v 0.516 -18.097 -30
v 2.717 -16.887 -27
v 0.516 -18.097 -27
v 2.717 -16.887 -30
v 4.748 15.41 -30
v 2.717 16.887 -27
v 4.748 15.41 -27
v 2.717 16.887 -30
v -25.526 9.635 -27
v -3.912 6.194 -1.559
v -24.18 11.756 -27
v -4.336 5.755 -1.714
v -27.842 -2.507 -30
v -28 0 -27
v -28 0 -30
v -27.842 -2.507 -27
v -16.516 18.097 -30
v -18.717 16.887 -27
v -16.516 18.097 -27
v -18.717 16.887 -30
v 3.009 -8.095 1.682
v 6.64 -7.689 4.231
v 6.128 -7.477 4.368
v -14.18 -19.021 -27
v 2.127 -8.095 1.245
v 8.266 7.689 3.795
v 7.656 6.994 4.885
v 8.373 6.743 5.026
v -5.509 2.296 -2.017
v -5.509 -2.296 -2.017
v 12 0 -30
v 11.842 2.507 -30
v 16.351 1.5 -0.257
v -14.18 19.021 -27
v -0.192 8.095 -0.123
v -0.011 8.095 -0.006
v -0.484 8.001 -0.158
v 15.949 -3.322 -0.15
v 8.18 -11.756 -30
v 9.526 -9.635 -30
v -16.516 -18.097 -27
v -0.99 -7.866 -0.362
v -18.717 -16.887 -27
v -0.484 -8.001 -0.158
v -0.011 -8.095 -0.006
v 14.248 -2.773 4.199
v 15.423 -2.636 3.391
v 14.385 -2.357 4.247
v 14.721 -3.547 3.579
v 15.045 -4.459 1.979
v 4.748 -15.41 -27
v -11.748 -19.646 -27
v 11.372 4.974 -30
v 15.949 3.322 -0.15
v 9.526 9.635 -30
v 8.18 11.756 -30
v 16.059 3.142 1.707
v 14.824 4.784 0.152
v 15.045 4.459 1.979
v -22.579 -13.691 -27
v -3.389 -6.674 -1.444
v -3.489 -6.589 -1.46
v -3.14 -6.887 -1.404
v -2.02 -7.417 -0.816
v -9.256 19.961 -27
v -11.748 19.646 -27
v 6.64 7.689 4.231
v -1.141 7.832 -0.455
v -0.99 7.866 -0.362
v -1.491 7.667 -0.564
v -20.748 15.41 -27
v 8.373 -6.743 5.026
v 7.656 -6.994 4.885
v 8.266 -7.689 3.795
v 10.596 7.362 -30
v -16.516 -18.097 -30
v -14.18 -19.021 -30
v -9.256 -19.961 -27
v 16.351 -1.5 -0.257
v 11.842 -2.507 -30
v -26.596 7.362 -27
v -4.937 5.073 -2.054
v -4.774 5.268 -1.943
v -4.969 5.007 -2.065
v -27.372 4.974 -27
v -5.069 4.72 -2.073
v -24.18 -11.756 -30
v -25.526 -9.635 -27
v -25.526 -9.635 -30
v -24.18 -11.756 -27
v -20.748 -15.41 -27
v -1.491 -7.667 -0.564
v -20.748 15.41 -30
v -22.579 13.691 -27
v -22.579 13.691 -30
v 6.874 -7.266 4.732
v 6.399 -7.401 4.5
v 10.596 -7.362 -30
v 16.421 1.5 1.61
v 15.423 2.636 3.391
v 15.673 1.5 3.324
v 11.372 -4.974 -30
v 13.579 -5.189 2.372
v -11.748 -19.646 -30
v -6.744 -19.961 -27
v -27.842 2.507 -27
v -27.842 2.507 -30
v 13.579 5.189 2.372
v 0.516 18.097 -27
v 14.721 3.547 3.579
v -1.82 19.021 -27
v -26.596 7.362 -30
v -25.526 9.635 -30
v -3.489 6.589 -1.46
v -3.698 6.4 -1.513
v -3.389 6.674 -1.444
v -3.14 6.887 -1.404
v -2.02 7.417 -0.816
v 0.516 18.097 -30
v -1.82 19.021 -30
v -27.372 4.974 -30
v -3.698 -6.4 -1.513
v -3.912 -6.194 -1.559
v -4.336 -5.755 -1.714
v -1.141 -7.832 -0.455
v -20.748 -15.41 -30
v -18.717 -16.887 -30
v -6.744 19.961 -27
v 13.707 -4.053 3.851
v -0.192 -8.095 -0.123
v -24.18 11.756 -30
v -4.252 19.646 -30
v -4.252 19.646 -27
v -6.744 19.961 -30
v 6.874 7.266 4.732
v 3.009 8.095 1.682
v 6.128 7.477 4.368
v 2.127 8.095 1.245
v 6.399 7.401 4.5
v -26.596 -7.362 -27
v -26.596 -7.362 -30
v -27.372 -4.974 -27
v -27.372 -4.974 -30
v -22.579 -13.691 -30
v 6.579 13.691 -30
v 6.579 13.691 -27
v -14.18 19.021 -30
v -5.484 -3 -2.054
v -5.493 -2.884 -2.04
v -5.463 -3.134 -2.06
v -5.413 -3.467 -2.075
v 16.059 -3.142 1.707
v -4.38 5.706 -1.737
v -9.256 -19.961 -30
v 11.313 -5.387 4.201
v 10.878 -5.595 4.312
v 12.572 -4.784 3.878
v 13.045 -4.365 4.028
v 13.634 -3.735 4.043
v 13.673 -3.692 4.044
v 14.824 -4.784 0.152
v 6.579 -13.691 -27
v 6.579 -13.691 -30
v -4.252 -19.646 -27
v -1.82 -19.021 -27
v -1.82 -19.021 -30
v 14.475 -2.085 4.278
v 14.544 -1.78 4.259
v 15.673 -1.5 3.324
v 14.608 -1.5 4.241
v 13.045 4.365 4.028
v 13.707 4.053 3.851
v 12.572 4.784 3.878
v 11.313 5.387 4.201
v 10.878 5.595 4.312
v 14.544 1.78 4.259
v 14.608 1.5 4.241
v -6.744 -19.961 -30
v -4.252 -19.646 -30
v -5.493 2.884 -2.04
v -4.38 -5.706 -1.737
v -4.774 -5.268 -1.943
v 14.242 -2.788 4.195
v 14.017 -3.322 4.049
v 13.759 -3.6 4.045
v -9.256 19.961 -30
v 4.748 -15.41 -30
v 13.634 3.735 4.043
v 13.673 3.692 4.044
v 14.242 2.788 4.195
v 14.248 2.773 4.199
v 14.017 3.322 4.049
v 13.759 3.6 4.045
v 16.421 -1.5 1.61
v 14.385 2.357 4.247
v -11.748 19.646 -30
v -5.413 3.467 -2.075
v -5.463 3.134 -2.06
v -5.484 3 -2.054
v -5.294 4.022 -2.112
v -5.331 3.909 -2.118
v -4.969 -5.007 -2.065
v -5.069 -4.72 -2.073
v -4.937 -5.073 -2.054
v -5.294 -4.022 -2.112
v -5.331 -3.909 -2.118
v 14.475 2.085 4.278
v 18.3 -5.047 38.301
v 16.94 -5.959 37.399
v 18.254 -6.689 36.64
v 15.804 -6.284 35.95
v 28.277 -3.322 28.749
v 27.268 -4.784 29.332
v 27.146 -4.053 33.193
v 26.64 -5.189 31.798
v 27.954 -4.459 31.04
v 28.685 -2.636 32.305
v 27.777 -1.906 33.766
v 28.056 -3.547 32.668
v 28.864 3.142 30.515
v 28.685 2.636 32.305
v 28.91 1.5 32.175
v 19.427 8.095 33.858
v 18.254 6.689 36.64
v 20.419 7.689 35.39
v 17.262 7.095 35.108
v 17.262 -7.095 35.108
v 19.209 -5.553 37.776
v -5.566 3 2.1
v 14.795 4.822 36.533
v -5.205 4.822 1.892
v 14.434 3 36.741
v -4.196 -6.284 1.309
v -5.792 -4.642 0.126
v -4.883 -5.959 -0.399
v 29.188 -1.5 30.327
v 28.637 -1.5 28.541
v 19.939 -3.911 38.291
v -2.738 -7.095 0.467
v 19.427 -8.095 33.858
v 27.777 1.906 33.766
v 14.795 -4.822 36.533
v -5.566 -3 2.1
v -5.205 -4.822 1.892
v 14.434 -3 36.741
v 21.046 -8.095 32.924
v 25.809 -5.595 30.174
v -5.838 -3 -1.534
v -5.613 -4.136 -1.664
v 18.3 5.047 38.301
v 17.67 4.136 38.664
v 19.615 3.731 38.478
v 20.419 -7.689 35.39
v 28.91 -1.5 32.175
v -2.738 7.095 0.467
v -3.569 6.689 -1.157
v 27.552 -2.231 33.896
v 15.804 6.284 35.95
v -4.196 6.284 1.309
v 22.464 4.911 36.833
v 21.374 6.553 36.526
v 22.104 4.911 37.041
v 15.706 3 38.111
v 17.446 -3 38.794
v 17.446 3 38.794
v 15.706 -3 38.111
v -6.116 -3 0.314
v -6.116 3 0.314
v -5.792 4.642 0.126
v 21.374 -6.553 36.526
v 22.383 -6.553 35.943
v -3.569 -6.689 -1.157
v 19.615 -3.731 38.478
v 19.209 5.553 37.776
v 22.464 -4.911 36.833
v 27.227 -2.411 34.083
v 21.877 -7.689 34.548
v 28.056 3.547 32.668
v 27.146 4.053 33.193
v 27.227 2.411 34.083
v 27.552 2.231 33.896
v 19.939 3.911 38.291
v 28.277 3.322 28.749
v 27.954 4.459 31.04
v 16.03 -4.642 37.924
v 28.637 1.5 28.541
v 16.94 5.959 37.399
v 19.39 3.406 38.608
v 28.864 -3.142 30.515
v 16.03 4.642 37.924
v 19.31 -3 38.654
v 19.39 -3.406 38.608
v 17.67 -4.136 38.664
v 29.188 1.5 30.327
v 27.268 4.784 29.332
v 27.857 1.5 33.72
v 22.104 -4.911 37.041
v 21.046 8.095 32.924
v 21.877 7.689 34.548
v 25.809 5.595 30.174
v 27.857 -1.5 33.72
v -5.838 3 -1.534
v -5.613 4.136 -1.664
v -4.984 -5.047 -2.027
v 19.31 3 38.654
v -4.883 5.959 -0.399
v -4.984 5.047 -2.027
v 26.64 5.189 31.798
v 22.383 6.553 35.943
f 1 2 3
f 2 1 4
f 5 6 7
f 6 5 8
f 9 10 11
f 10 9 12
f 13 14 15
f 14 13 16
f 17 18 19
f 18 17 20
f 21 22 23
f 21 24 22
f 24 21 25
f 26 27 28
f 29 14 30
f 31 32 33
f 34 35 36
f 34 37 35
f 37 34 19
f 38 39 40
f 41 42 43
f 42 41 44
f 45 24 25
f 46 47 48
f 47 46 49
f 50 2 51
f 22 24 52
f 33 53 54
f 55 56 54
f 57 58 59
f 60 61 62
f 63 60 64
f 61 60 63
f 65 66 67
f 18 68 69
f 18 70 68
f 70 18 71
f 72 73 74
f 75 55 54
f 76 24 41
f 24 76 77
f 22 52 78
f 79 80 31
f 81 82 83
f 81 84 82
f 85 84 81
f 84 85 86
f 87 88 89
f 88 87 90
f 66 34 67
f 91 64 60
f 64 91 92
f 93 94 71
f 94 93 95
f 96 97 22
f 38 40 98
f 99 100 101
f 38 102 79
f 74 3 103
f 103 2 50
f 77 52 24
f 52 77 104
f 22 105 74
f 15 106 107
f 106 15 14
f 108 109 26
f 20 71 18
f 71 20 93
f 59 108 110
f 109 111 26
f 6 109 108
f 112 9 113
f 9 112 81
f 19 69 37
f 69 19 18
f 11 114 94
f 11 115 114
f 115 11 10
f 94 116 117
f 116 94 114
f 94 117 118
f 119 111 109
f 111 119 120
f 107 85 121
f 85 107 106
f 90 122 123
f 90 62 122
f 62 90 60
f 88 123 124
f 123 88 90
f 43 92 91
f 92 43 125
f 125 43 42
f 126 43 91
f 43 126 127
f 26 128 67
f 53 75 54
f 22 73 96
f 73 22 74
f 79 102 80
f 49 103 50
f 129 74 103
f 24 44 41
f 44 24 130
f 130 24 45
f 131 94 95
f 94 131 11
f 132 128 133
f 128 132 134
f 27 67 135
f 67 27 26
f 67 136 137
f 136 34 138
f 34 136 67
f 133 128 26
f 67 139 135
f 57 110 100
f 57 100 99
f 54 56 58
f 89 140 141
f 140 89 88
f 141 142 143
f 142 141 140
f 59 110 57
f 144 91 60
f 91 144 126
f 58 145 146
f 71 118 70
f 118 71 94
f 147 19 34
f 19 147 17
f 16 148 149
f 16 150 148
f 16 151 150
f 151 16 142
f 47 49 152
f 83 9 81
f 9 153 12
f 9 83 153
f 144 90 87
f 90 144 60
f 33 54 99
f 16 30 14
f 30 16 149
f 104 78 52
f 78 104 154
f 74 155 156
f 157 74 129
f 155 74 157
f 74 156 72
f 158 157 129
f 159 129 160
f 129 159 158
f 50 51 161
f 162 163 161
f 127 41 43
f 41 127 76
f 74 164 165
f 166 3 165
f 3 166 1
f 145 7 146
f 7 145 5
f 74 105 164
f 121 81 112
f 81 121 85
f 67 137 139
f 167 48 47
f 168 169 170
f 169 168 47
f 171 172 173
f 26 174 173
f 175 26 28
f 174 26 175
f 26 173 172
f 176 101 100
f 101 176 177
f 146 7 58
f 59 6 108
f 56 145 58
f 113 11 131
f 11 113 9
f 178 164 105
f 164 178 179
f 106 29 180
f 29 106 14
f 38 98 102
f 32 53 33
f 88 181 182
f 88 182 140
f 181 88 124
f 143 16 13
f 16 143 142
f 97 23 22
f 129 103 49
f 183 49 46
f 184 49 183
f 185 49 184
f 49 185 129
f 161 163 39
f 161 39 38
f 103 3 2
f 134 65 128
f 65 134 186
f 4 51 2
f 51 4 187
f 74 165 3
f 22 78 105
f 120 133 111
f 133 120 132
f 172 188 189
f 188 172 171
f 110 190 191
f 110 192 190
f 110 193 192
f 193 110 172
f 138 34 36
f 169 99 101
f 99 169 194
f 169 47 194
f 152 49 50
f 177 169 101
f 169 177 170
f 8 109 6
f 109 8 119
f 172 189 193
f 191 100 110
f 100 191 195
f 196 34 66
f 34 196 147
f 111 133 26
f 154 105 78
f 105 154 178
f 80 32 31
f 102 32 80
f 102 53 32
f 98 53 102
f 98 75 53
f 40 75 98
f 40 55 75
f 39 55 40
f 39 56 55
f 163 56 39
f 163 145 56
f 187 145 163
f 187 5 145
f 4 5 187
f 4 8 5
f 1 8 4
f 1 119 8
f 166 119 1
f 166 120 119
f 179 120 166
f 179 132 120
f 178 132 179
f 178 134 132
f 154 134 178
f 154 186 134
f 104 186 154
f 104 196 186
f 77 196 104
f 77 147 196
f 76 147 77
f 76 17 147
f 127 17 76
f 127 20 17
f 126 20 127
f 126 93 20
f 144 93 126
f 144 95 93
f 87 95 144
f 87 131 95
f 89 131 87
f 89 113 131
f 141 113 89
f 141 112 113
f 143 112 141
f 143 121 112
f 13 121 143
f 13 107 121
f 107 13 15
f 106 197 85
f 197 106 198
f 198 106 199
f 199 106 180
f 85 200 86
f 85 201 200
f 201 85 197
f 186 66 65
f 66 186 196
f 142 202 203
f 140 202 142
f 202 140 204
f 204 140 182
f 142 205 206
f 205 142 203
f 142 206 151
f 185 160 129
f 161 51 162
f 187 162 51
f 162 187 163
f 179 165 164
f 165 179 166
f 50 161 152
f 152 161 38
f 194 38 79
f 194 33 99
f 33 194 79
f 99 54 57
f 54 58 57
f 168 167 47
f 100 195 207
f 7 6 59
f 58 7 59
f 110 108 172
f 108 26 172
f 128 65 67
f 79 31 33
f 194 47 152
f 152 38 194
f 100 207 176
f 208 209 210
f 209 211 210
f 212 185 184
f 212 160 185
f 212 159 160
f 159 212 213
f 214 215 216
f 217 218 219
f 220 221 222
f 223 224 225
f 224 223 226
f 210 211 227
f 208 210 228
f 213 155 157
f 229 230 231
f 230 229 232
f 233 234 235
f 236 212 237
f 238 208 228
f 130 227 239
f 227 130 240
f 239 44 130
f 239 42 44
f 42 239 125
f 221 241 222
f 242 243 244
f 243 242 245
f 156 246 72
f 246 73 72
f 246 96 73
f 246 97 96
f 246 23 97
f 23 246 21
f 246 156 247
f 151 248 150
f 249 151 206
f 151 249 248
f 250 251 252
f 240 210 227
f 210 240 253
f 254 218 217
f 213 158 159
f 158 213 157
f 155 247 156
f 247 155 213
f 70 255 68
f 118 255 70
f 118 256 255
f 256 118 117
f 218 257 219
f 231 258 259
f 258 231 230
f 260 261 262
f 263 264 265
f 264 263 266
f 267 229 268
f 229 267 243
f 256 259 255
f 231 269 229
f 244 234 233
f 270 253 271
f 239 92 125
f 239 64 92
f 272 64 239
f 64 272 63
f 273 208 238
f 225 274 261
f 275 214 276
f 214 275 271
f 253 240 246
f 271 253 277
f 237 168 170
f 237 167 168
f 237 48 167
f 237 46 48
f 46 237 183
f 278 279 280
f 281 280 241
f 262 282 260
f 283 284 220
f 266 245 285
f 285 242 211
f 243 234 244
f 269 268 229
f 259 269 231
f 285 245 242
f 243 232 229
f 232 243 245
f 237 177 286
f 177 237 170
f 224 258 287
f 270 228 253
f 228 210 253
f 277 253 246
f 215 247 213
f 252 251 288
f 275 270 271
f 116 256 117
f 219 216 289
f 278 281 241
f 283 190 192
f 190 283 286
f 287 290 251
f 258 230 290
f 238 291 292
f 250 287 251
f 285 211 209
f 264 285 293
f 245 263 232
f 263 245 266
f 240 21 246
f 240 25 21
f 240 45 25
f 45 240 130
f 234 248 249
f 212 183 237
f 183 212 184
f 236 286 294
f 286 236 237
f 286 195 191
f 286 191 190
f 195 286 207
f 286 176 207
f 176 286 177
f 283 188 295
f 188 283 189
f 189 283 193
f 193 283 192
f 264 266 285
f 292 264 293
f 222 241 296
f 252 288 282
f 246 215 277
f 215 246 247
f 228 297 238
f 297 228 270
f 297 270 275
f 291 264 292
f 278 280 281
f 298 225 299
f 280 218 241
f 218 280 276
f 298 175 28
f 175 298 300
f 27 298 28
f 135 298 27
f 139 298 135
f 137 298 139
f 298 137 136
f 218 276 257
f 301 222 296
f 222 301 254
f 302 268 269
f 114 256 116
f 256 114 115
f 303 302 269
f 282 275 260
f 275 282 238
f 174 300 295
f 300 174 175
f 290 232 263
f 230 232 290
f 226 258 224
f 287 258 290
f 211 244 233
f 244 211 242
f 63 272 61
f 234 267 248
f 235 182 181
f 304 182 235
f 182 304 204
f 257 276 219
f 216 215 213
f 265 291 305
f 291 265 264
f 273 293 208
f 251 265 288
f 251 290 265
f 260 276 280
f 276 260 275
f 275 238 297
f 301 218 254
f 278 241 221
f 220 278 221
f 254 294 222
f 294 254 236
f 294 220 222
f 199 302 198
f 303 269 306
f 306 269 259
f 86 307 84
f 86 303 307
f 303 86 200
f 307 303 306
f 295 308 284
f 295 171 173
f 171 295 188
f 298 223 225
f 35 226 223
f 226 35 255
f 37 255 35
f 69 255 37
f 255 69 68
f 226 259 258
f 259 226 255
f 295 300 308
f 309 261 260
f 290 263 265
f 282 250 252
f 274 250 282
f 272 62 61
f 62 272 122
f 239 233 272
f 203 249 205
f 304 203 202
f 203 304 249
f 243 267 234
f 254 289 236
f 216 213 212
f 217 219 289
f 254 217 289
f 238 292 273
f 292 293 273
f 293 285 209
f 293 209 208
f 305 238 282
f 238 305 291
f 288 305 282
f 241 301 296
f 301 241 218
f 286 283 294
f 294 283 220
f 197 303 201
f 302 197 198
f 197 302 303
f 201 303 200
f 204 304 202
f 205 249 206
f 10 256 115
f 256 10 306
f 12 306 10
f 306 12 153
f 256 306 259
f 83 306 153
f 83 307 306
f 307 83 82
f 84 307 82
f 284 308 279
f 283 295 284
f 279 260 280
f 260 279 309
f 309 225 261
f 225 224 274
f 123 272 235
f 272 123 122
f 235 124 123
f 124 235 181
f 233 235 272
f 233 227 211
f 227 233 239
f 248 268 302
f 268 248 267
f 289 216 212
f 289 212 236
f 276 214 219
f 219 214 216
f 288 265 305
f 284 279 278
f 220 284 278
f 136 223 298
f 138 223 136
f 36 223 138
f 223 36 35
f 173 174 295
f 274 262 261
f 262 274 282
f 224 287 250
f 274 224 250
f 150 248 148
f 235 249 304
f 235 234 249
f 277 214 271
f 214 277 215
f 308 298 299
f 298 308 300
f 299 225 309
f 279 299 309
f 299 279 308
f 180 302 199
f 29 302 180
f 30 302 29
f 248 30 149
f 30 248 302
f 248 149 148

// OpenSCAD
// file: triangulation.scad
function _furthestAwayFromPoint(points,poly,z,bestD=-1,bestPos=0,pos=0) = 
    len(poly) <= pos ? bestPos :
    norm(points[poly[pos]]-z) > bestD ? _furthestAwayFromPoint(points,poly,z,bestD=norm(points[poly[pos]]-z),bestPos=pos,pos=pos+1) :
    _furthestAwayFromPoint(points,poly,z,bestD=bestD,bestPos=bestPos,pos=pos+1);
    
function _triangleArea(a,b,c) = norm(cross(b-a,c-a))/2;
    
function _furthestAwayFromLine(points,poly,z1,z2,bestArea=-1,bestPos=0,pos=0) = 
    len(poly) <= pos ? bestPos :
    _triangleArea(z1,z2,points[poly[pos]]) > bestArea ? _furthestAwayFromLine(points,poly,z1,z2,bestArea=_triangleArea(z1,z2,points[poly[pos]]),bestPos=pos,pos=pos+1) :
    _furthestAwayFromLine(points,poly,z1,z2,bestArea=bestArea,bestPos=bestPos,pos=pos+1);
    
function normalize(v) = v/norm(v);

function _winding(points,poly,sum=0,pos=0) =
    pos >= len(poly) ? sum :
    _winding(points,poly,sum=sum+(points[poly[(pos+1)%len(poly)]][0]-points[poly[pos]][0])*(points[poly[(pos+1)%len(poly)]][1]+points[poly[pos]][1]),pos=pos+1);

function _isCCW(points,poly) =
_winding(points,poly) < 0;

function identifyPlane(points,poly) = let(i=_furthestAwayFromPoint(points,poly,points[poly[0]]),
           j=_furthestAwayFromLine(points,poly,points[poly[0]],points[poly[i]]),
           normal = cross(points[poly[i]]-points[poly[0]],points[poly[j]]-points[poly[0]]),
           a = points[poly[i]]-points[poly[0]],
           b = cross(normal,a),
           cs = [points[poly[0]],normalize(a),normalize(b),normalize(normal)])
           _isCCW(projectPoints(cs,points),poly) ? cs : [cs[0],-cs[1],cs[2],cs[3]];
                      
function projectPoint(coordsys,p) = let(v=p-coordsys[0],
           vp=v-(v*coordsys[3])*coordsys[3]) [vp*coordsys[1],vp*coordsys[2]];
           
function projectPoints(coordsys,p) = [for(v=p) projectPoint(coordsys,v)];
    
function triangulate(points,poly=undef) = 
    let(poly = poly==undef ? [for(i=[0:1:len(points)-1]) i] : poly)
    len(points[poly[0]]) == 2 ? triangulate2D(points,poly) : triangulate2D(projectPoints(identifyPlane(points,poly),points),poly);

function mod(a,b) = let(m=a%b) m < 0 ? m+b : m;

function _delPoint(v,i) = [for(j=[0:1:len(v)-1]) if(i!=j) v[j]];
    
function _isCCWTriangle(a,b,c) = cross(b-a,c-a) >= 0;
    
function _crosses(points,poly,a,b,ignore,pos=0) =     
    pos >= len(poly) ? false :
    ignore != pos && ignore !=  mod(pos+1,len(poly)) && _isCross(points[poly[pos]],points[poly[mod(pos+1,len(poly))]],a,b) ? true : _crosses(points,poly,a,b,pos=pos+1);

function _isReflex(points,poly,i) = 
    let(n=len(poly),
        a=points[poly[mod(i-1,n)]],
        b=points[poly[i]],
        c=points[poly[mod(i+1,n)]]) cross(b-a,c-b) < 0;
                
function _checkEar2(points,poly,a,b,c,j) = 
   let(p=points[poly[mod(j,len(poly))]],
       c1=cross(p-a,b-a))
       ! ( c1*cross(p-b,c-b) >0 && c1*cross(p-c,a-c)>0 );
                
function _checkEar(points,poly,a,b,c,i,j) =
    mod(j,len(poly))==mod(i-1,len(poly)) ? true :
    _isReflex(points,poly,mod(j,len(poly))) && ! _checkEar2(points,poly,a,b,c,j) ? false :
    _checkEar(points,poly,a,b,c,i,j+1);

function _isEar(points,poly,i) = 
    _isReflex(points,poly,i) ? false :
    let(n=len(poly),
        a=points[poly[mod(i-1,n)]],
        b=points[poly[i]],
        c=points[poly[mod(i+1,n)]],
        j=i+2)
        _checkEar(points,poly,a,b,c,i,i+2);        

function _findEar(points,poly,pos=0) =
    assert(pos<len(poly))
    _isEar(points,poly,pos) ? pos : _findEar(points,poly,pos=pos+1);

function _cutEar(points,poly) = 
    let(n=len(poly),
        i=_findEar(points,poly))
        _delPoint(poly,i);
            
function _getEar(points,poly) = 
    let(n=len(poly),
        i=_findEar(points,poly))
        [poly[mod(i-1,n)],poly[i],poly[mod(i+1,n)]];

function triangulate2D(points,poly,soFar=[]) = 
    len(poly) == 3 ? concat(soFar,[poly]) :
    triangulate2D(points,_cutEar(points,poly),soFar=concat(soFar,[_getEar(points,poly)]));
    
module showTriangulation(points,tt) 
{
    for(t=tt) {
        for(i=[0:2]) {
            hull() {
                translate(points[t[i]]) sphere(d=1);
                translate(points[t[(i+1)%3]]) sphere(d=1);
            }
        }
    }
}

//<skip>
function testPoly2(n) = concat([for(i=[0:n-1]) 20*[cos(i*360/n),0*rands(0,.3,1)[0],sin(i*360/n)]],[for(i=[0:n-1]) 20*[0.8*cos(i*360/n),0*rands(0,.3,1)[0],-0.8*sin(i*360/n)]]);

testPoints=testPoly2(10);
showTriangulation(testPoints,triangulate(testPoints));
//</skip>
// main file
use<tubemesh.scad>;

module snap(s, h) {
  rotate([ 0, 0, 180 ]) linear_extrude(height = h) polygon(points = [
    [ 0 * s, -3 * s ],
    [ 0 * s, 3 * s ],
    [ 11 * s, 8 * s ],
    [ 16 * s, 6 * s ],
    [ 16 * s, -6 * s ],
    [ 11 * s, -8 * s ],
  ]);
}

module stand() {
  //<params>
  angleToGround = 65;
  kickstandDiameter = 10;
  minimumThickness = 10;
  tolerance = 1;
  length = 30;
  bottomDiameter = 40;
  bottomDistance = 40;
  bottomRim = 3;
  //</params>

  $fn = 50;

  id = kickstandDiameter + 2 * tolerance;

  function translate(z, p) = [for (q = p) z + q];

  function tiltXZ(angle, p) =
      [for (q = p)[cos(angle) * q[0] - sin(angle) * q[2], q[1],
                   sin(angle) * q[0] + cos(angle) * q[2]]];

  topSection0 =
      sectionZ(ngonPoints(n = $fn, r = (id + minimumThickness) / 2), 0);

  z1 = [ cos(angleToGround), 0, sin(angleToGround) ];
  topSection = translate(z1 * length * 0.5, tiltXZ(angleToGround - 90, topSection0));

  sections = [
    sectionZ(ngonPoints(n = $fn, r = bottomDiameter / 2), 0),
    sectionZ(ngonPoints(n = $fn, r = bottomDiameter / 2), bottomRim),
    topSection
  ];

  difference() {
    tubeMesh(sections);
    translate(z1 * bottomDistance) rotate([ 0, 90 - angleToGround, 0 ])
        cylinder(h = 2 * length, d = id);
  }
}

// translate([ -8, 0, -30 ]) stand();
// minkowski() {

hull() {
  translate([ 11, 0, -4 ]) rotate([ 0, 15, 0 ]) minkowski() {
    snap(0.5, 5);
    sphere(4.2);
  }
  translate([ -8, 0, -30 ]) stand();
}

union() {
  translate([ 5, 0, -4 ]) rotate([ 0, 30, 0 ]) minkowski() {
    snap(0.5, 40);
    sphere(4.2);
  }
}
// cylinder(h = 1, d = 4);
// }
// snap(1);
